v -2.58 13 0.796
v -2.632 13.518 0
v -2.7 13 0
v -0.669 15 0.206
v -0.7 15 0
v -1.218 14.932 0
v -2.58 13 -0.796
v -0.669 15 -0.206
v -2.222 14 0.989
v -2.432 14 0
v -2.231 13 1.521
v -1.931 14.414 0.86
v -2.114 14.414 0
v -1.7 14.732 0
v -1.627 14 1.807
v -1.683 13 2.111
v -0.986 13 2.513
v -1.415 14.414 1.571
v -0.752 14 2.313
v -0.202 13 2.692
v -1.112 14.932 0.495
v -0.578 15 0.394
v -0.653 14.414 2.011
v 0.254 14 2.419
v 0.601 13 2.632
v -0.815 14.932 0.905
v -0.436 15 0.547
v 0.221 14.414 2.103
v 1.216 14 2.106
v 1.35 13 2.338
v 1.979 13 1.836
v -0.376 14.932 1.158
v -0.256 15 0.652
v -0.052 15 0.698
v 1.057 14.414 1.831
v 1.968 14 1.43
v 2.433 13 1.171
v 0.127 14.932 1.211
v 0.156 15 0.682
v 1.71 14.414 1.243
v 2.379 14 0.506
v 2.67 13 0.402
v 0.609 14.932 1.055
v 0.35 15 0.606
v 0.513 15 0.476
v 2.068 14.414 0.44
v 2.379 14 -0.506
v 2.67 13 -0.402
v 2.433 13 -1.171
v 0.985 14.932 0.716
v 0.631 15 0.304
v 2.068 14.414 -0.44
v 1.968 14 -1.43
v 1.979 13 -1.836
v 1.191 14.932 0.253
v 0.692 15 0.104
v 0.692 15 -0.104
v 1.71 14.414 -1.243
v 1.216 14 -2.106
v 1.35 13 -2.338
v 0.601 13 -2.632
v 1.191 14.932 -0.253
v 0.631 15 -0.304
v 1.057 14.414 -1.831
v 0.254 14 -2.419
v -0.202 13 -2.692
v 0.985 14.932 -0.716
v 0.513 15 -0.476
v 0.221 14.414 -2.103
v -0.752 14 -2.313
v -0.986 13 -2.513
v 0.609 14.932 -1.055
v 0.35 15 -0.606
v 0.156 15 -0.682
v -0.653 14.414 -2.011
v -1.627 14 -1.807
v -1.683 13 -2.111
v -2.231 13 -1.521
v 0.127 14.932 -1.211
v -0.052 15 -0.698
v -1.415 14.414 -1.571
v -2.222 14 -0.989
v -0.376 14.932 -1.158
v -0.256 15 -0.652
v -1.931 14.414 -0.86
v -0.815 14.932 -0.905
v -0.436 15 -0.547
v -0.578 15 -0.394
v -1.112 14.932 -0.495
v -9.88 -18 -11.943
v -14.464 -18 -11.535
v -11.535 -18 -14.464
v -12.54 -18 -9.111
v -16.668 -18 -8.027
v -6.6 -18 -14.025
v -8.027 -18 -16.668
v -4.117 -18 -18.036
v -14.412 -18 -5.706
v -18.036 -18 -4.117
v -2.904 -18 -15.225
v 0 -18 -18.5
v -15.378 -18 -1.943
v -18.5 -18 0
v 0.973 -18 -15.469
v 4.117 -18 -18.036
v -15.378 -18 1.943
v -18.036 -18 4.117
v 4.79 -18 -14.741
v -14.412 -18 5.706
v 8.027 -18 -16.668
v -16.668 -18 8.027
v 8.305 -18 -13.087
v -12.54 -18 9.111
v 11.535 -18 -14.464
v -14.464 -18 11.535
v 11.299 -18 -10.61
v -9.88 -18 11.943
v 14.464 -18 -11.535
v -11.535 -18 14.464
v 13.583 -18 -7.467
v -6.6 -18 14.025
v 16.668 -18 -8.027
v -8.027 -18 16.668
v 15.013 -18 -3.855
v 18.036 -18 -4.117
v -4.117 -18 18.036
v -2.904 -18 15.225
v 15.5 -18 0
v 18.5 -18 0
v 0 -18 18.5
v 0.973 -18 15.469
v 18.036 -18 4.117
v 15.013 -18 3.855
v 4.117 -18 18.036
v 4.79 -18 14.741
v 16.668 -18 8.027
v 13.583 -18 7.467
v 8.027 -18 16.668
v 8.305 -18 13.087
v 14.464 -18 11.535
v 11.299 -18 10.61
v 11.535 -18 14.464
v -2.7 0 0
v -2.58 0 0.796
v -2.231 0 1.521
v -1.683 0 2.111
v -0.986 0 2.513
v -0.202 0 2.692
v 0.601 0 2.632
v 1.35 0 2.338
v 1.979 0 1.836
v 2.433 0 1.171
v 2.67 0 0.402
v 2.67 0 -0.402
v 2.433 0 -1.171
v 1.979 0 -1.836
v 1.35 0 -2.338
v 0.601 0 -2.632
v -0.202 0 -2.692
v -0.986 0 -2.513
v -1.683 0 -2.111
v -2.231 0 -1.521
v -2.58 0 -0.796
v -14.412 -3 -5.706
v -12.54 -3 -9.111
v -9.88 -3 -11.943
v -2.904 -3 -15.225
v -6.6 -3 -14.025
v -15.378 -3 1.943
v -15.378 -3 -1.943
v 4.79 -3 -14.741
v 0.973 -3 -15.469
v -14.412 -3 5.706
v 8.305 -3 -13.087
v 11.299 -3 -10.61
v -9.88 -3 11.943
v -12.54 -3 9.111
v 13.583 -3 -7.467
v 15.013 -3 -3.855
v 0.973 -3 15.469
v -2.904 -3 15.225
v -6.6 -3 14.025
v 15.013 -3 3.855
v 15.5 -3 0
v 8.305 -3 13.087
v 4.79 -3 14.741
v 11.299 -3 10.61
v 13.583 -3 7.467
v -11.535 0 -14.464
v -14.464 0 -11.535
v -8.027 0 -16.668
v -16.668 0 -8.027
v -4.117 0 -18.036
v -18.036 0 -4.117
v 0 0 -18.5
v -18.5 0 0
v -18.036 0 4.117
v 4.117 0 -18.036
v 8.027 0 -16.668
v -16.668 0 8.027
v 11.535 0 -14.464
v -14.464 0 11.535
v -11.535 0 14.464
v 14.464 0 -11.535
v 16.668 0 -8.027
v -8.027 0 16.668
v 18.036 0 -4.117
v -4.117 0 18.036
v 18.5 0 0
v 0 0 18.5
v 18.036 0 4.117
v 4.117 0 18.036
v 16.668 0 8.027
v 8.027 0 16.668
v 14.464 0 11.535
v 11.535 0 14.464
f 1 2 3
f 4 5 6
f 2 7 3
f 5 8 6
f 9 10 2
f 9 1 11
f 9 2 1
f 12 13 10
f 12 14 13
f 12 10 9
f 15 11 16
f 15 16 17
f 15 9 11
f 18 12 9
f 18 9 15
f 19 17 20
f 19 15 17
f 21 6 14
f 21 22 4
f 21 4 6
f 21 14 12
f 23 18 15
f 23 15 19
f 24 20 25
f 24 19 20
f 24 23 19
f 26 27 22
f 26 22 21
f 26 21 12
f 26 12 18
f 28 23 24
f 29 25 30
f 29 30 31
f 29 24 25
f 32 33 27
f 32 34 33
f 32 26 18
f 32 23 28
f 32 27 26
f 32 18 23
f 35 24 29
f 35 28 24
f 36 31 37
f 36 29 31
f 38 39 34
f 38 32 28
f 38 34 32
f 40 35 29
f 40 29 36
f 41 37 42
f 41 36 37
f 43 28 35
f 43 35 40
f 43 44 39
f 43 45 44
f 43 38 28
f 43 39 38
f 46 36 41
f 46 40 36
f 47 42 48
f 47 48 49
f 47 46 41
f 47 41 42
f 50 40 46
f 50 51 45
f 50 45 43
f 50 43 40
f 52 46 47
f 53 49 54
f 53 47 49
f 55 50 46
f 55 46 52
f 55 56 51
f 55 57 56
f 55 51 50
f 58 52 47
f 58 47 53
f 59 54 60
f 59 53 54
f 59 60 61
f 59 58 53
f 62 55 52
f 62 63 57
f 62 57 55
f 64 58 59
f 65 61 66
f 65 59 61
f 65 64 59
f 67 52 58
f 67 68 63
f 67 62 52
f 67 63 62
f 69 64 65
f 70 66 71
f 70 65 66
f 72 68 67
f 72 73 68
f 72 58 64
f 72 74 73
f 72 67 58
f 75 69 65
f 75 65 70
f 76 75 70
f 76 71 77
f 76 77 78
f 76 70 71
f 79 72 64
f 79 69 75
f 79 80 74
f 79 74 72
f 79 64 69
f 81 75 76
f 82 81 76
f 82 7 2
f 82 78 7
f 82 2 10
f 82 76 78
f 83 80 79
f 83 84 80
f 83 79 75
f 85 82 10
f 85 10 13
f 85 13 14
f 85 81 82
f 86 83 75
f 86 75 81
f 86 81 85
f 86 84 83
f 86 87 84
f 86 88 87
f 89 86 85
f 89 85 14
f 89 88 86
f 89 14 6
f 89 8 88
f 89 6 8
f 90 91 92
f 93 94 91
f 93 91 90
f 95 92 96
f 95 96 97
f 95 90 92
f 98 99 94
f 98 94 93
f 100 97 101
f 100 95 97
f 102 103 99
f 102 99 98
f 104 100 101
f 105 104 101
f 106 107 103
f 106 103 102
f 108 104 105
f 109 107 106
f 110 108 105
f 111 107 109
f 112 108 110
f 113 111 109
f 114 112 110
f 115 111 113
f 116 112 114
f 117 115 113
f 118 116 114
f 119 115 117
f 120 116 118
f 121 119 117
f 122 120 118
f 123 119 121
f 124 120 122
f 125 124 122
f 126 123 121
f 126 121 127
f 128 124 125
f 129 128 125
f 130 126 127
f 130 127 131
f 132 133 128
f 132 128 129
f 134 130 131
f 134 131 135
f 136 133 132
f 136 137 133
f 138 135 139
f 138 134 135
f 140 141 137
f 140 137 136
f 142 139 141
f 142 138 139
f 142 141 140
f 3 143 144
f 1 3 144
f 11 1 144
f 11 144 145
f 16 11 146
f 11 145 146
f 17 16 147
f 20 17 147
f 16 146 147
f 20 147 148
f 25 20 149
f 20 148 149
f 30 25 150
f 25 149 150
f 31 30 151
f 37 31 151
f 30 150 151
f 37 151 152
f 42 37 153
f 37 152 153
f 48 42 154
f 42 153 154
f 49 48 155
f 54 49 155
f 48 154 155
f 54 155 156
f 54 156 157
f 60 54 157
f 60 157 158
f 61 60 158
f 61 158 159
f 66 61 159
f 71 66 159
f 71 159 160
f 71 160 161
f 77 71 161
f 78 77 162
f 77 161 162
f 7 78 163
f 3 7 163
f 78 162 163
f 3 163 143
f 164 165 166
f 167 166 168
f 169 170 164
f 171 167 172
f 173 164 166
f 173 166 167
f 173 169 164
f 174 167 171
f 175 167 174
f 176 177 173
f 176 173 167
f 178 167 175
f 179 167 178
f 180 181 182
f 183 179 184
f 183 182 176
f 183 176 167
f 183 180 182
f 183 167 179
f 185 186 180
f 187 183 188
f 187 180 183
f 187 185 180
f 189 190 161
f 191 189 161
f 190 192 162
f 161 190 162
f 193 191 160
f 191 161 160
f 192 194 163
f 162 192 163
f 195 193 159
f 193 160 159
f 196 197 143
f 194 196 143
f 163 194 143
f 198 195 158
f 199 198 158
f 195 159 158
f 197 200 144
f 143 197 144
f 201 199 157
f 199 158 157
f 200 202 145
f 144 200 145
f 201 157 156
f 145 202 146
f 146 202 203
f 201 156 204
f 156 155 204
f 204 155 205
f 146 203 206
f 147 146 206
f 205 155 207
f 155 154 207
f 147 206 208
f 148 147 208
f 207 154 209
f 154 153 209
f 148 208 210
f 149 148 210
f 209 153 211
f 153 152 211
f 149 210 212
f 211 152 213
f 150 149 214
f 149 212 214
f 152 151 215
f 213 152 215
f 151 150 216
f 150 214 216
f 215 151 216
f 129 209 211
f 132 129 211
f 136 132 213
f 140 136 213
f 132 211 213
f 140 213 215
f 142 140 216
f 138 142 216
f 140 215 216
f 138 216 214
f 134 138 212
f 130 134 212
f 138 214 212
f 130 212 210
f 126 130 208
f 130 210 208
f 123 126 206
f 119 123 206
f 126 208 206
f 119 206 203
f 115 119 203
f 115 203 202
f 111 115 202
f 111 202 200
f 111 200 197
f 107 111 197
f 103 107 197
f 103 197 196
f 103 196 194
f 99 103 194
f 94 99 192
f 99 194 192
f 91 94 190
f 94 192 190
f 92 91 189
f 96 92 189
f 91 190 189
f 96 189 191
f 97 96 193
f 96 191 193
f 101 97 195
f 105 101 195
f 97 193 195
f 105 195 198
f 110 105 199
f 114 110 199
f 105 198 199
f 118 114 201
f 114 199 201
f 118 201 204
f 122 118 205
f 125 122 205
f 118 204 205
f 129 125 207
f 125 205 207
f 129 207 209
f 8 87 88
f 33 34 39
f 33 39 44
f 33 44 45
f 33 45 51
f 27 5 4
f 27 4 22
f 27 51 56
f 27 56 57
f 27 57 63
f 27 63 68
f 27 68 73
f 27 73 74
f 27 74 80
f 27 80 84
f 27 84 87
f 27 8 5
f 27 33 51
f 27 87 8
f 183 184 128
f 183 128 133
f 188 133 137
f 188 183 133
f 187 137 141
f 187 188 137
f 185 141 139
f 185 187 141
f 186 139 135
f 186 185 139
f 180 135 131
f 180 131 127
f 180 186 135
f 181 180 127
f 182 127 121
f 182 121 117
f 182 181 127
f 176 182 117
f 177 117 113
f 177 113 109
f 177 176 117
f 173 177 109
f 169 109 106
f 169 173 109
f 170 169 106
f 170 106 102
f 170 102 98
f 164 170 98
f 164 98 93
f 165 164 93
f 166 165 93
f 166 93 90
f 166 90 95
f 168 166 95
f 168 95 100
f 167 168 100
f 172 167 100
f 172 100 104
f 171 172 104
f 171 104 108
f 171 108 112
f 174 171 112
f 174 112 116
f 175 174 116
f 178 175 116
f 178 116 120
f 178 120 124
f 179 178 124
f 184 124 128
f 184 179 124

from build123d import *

# Parameters (mm, degrees)
F0_R     = 18.5
F1_DEPTH = 18
F2_T     = -3
F3_R     = 2.7
F4_DEPTH = 15
F5_R     = 2


with BuildPart() as f1:
    # F0 (on Front) → F1 (new body)
    with BuildSketch(Plane.XZ):
        Circle(F0_R)
    extrude(amount=F1_DEPTH)

    # F2
    f2_openings = [f1.faces().sort_by_distance(p)[0] for p in [
        (0, -18, 0),
    ]]
    offset(amount=F2_T, openings=f2_openings)

    # F3 (on face) → F4 (join)
    with BuildSketch(Plane(origin=(0, 0, 0), x_dir=(-1, 0, 0), z_dir=(0, 1, 0))):
        Circle(F3_R)
    extrude(amount=F4_DEPTH)

    # F5
    f5_edges = [f1.edges().sort_by_distance(p)[0] for p in [
        (2.7, 15, 0),
    ]]
    fillet(f5_edges, radius=F5_R)


solid = f1.part
